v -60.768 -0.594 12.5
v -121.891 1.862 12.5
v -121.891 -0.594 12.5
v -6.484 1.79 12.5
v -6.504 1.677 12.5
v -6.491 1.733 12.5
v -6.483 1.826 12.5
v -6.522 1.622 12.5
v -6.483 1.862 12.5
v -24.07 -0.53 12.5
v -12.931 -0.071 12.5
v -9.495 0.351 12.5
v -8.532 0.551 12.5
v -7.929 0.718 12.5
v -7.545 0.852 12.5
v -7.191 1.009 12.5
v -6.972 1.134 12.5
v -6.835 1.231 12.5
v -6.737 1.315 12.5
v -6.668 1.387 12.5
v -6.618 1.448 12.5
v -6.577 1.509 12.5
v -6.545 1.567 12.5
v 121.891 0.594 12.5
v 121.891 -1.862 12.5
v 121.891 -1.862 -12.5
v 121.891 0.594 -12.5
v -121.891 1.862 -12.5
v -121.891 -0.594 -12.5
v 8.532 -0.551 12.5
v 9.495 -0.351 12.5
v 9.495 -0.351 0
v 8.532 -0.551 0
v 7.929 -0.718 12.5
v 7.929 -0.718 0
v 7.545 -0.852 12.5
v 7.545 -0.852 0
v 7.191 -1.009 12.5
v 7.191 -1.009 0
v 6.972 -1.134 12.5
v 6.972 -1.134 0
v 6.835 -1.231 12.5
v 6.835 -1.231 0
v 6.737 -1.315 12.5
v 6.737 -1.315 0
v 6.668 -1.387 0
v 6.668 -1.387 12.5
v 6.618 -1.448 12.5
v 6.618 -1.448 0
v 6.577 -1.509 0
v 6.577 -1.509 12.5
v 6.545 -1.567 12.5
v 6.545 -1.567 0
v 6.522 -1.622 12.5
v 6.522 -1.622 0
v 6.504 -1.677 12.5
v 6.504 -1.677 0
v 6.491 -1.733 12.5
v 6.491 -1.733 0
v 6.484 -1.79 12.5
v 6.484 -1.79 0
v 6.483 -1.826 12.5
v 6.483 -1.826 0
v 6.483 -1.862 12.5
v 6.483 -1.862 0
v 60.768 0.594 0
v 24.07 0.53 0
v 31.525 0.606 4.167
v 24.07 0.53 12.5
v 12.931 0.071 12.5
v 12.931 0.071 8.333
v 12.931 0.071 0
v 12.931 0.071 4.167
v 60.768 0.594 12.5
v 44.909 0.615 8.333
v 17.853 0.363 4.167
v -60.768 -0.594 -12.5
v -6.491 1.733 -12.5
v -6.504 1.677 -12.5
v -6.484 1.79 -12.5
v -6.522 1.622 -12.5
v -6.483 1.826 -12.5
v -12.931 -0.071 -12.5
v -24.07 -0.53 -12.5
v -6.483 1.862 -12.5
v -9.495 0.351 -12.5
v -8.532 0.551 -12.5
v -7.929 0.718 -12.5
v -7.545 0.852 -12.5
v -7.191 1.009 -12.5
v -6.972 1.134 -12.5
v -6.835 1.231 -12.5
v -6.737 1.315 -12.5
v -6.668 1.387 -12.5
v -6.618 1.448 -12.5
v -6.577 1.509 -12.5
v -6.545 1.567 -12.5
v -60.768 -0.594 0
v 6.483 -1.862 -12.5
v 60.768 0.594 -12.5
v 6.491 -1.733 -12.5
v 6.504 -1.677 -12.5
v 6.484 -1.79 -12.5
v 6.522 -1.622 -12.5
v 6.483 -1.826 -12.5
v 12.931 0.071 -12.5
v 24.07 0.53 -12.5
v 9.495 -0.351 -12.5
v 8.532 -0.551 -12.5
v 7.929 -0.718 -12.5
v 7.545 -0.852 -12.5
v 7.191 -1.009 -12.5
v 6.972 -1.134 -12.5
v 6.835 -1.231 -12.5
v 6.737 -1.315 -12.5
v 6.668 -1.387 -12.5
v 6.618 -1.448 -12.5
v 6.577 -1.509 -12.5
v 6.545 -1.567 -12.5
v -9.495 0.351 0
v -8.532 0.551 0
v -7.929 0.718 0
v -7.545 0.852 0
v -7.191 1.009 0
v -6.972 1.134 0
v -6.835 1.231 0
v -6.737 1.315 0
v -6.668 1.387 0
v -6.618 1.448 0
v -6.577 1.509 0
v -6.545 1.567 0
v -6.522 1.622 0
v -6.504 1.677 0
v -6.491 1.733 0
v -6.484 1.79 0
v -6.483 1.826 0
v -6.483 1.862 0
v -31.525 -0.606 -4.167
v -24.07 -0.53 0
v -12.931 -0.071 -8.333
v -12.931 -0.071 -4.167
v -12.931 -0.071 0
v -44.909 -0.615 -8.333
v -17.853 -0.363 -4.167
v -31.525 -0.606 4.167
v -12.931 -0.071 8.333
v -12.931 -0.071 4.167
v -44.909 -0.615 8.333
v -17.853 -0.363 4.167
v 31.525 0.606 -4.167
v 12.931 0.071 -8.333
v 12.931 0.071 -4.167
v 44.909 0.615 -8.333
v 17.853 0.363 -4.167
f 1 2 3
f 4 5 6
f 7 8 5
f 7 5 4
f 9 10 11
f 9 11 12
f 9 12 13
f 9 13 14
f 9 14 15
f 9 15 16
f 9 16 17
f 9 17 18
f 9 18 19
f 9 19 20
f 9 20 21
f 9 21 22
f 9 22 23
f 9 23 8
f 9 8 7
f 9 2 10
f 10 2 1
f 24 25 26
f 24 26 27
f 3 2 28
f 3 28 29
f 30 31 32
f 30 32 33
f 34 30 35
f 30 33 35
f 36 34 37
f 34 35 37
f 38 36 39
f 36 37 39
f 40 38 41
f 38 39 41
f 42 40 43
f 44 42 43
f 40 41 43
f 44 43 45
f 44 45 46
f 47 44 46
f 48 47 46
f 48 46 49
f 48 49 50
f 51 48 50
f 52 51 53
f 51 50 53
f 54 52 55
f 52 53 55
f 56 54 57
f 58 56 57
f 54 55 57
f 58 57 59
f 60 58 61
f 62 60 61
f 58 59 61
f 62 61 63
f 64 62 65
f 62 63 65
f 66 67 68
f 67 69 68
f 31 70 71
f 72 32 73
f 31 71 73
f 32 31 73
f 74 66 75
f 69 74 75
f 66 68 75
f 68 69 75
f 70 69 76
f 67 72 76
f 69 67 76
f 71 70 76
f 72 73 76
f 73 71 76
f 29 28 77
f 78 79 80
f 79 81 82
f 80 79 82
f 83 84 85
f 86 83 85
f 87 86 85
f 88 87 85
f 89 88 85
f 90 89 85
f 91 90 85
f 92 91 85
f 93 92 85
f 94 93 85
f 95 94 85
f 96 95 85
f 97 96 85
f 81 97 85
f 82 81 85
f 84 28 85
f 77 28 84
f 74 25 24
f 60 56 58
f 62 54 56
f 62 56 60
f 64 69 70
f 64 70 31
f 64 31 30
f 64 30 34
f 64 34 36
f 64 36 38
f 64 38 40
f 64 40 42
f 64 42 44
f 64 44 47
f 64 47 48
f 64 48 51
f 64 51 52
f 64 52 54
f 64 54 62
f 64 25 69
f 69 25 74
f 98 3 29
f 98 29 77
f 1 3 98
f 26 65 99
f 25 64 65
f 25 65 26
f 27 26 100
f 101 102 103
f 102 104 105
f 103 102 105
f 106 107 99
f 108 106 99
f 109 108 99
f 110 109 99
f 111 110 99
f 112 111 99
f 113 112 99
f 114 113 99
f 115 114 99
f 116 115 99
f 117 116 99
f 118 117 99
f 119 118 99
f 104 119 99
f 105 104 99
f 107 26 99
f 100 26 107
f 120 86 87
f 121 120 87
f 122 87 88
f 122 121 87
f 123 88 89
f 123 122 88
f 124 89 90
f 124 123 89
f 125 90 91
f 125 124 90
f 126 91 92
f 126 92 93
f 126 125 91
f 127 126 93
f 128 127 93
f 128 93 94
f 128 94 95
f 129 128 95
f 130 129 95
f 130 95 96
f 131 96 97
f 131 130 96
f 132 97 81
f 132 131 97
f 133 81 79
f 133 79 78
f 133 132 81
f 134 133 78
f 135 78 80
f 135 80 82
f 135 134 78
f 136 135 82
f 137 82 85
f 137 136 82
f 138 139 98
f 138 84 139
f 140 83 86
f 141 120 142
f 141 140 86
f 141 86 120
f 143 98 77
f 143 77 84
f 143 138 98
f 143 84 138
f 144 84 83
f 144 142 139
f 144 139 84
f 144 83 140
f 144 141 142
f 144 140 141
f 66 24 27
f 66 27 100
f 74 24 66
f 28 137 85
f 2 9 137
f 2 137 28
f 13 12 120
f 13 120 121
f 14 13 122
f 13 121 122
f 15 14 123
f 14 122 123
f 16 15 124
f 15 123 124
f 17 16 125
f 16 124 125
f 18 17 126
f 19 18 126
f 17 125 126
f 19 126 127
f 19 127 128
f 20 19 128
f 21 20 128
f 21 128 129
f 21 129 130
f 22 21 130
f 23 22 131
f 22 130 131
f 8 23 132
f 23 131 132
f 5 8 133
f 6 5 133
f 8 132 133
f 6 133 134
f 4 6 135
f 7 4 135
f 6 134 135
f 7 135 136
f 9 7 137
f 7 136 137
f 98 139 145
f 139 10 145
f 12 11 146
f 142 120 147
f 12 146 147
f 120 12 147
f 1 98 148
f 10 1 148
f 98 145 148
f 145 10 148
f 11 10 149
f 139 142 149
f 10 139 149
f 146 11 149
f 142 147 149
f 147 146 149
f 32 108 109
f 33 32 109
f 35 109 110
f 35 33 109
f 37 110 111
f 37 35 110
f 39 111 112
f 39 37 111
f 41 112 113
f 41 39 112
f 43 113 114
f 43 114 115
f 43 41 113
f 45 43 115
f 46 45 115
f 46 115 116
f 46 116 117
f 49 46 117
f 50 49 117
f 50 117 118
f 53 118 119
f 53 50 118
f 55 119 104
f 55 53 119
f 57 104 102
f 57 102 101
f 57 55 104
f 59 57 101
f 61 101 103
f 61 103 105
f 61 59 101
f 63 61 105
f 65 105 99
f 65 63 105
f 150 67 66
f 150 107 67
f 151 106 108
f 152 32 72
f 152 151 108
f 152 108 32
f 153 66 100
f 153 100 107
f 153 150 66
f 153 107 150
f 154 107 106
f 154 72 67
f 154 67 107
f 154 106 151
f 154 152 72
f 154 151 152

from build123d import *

# Parameters (mm, degrees)
F1_DEPTH = 12.5


with BuildPart() as f1:
    # F0 (on Top) → F1 (new body, symmetric)
    with BuildSketch(Plane.XY):
        with BuildLine():
            Line((-6.48321, 1.862325), (-121.891181, 1.862325))
            Line((-121.891181, 1.862325), (-121.891181, -0.593989))
            Line((-121.891181, -0.593989), (-60.768084, -0.593989))
            add(Edge.make_bspline(
                [(-60.768084, -0.593989), (-26.700584, -0.593989), (-6.357463, -1.055275), (-6.48321, 1.862325)],
                knots=[0, 0, 0, 0, 54.340418, 54.340418, 54.340418, 54.340418], degree=3))
        make_face()
    extrude(amount=F1_DEPTH, both=True)


with BuildPart() as f2_1:
    # F2: instance of F1
    add(f1.part.mirror(Plane.YZ))


with BuildPart() as f3_1:
    # F3: instance of F2_1
    add(f2_1.part.mirror(Plane.XZ))


solid = Compound([f1.part, f3_1.part])
